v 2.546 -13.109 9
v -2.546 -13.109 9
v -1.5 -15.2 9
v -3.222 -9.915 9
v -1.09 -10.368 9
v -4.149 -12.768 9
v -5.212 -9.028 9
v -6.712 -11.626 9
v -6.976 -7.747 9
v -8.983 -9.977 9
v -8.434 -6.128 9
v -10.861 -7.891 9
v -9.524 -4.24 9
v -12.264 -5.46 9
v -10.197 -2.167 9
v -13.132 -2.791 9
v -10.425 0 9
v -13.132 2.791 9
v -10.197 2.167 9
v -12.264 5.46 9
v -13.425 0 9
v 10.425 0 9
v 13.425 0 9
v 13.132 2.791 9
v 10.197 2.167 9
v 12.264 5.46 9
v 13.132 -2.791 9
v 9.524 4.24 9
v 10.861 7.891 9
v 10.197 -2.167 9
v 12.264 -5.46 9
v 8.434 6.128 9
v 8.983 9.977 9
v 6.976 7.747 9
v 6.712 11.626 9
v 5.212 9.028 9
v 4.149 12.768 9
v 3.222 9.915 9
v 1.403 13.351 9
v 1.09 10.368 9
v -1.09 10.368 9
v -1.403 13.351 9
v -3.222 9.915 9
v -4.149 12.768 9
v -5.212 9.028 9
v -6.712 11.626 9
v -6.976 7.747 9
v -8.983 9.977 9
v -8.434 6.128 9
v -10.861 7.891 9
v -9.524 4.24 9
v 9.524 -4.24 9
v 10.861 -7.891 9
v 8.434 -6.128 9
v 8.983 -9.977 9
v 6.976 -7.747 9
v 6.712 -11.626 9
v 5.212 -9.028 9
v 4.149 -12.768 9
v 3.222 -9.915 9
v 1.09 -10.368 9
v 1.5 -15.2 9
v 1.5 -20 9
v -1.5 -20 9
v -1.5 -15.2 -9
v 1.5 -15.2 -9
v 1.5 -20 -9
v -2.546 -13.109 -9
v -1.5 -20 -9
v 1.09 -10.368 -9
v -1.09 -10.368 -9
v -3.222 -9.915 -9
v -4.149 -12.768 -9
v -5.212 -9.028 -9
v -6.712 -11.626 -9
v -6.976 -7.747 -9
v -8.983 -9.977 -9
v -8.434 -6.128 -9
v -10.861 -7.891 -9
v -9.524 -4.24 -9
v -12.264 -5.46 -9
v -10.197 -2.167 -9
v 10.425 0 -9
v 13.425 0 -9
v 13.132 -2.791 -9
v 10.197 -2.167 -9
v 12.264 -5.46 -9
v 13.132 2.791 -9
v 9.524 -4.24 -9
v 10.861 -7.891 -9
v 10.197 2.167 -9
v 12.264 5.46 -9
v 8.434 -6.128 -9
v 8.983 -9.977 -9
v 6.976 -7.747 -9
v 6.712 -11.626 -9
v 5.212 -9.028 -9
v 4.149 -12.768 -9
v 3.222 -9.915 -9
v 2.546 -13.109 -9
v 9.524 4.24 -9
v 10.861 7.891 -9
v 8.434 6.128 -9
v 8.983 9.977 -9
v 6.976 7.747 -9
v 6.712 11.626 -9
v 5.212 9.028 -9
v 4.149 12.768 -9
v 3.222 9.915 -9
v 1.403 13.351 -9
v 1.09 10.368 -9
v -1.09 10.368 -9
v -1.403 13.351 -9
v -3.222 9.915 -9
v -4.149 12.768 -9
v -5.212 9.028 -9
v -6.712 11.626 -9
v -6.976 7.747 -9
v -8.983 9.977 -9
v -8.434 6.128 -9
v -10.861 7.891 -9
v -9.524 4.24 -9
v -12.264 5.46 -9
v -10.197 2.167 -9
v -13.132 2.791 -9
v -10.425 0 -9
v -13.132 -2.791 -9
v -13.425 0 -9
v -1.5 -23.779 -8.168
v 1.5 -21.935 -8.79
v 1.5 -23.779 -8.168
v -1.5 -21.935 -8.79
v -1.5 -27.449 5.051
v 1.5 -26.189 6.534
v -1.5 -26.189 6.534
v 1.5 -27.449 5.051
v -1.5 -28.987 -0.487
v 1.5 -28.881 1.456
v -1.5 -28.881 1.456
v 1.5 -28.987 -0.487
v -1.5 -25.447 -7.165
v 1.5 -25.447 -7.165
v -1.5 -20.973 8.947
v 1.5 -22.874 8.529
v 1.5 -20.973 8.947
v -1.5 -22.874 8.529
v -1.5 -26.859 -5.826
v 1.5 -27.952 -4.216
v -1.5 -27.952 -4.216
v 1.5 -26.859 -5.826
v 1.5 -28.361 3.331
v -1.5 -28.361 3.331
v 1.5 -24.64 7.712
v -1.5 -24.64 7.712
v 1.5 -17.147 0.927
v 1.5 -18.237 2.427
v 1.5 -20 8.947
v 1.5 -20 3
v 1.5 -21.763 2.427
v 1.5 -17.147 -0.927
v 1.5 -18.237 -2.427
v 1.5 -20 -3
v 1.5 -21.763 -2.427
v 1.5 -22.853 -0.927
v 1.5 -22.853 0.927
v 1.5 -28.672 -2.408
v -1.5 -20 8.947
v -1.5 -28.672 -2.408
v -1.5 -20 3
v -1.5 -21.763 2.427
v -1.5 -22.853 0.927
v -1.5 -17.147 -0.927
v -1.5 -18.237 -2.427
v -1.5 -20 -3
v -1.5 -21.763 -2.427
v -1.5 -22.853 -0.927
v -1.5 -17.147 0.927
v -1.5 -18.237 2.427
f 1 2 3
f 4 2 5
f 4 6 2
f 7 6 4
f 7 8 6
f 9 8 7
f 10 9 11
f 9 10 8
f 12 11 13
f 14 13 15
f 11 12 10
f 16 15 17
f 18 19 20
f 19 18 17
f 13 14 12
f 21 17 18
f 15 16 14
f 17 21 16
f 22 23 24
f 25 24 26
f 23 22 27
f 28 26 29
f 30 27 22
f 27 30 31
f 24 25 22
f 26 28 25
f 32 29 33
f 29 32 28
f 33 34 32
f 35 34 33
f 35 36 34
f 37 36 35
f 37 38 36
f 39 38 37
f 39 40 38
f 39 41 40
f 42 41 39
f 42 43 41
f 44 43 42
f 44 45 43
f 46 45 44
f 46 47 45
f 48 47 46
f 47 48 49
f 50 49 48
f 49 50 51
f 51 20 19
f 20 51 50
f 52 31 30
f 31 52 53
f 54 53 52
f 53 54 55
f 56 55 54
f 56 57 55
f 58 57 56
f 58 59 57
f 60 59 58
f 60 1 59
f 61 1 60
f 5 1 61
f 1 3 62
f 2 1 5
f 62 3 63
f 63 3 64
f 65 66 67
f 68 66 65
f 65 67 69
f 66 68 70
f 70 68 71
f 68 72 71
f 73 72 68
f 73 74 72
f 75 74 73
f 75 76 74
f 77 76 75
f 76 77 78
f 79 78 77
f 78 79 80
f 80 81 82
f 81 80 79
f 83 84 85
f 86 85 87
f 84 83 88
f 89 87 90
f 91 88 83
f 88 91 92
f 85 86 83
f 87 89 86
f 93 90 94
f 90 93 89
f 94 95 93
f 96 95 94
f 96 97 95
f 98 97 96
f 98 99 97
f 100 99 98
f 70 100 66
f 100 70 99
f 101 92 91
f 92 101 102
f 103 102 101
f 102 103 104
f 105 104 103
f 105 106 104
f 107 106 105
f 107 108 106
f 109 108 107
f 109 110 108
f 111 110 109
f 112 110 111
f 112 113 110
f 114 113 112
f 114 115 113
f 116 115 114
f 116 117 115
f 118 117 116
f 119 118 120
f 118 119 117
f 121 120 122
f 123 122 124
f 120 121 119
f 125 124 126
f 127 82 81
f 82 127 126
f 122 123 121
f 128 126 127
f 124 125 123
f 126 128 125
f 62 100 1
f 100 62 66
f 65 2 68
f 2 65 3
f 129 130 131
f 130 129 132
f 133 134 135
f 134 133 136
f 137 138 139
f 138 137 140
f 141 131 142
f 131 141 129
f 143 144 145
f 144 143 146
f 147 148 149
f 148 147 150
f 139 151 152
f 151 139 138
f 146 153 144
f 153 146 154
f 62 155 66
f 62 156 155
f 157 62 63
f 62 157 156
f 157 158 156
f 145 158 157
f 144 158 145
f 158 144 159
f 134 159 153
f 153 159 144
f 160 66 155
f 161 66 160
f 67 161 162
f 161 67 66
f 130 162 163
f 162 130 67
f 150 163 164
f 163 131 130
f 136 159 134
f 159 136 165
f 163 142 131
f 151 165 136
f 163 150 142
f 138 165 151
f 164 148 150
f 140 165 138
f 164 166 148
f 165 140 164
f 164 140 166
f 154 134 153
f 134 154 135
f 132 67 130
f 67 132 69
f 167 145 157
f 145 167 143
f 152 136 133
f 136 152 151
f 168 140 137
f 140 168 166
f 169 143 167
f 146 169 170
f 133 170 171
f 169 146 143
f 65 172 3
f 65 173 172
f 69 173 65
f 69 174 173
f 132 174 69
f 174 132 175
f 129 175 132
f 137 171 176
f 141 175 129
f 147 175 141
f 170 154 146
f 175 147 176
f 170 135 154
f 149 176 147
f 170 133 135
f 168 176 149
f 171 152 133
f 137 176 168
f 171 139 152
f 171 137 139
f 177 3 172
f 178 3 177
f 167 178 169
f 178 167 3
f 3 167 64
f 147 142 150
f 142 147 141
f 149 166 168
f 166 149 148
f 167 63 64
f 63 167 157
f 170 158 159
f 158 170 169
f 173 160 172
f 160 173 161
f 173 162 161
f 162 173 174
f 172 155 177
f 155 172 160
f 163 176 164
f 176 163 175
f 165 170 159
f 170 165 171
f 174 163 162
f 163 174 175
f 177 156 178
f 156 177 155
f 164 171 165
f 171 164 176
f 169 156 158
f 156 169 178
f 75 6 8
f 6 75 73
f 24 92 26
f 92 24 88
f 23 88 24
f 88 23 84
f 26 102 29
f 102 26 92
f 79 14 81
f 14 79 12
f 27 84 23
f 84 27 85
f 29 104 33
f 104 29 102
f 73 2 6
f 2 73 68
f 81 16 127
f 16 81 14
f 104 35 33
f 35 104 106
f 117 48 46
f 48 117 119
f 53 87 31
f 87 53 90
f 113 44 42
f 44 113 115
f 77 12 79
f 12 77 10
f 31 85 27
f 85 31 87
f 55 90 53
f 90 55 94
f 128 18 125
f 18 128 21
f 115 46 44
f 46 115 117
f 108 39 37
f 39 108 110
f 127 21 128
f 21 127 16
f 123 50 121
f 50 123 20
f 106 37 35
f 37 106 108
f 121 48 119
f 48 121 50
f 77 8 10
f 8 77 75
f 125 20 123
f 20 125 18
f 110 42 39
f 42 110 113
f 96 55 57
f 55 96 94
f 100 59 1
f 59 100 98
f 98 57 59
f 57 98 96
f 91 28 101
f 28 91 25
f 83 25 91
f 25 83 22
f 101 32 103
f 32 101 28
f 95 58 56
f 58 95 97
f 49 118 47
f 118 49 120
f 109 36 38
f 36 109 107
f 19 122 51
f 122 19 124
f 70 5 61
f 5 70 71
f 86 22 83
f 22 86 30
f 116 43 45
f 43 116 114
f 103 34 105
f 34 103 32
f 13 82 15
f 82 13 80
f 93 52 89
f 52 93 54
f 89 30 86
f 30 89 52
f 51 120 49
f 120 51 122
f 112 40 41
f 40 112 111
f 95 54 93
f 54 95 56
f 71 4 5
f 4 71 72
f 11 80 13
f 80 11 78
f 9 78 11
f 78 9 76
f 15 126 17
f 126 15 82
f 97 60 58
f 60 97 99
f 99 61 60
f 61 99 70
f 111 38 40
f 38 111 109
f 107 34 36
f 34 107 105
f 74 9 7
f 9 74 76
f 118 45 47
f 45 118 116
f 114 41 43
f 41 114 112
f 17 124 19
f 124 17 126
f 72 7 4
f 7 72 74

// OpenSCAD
// file: ../parts/buttress.scad
/*
 * Written by Dermot Tynan, Kalopa Research.
 * GPLv2.
 *
 * All dimensions are in mm.
 */

/*
 * Create a buttress to reinforce a vertical column.
 * The height and length specify how high and how far out the
 * buttress goes, and the width is the width of the thing.
 */
module buttress(height, length, width)
{
	phi = atan(length / height);
	cx = length / sin(phi);
	cy = length / cos(phi);
	intersection() {
		rotate(a = [90, 90 - phi, 0])
			cube([cx, cy, width], center = true);
		translate([length/2, 0, cy*sin(phi)/2])
			cube([length, width + 2, height], center = true);
	}
}

buttress(25, 10, 2);
// file: constants.scad
/*
 * Written by Dermot Tynan, Kalopa Research.
 * GPLv2.
 *
 * This file has all the constants for the OpenWing sail.
 *
 * All dimensions are in mm.
 */
wall_thickness = 3;

cf_mast_outer_dia = 20.85;
cf_mast_inner_dia = 17.90;
cf_mast_insert_len = 20;

mast_cap_dia = 24;
mast_cap_height = 16;
mast_base_x = 24;
mast_base_y = 24;
mast_base_height = 12;
mast_base_grip_off = 8;
mast_base_grip_dia = 3.2;

gooseneck_height = 24;
gooseneck_len = 20;
gooseneck_barrel_dia = 11;
gooseplate_width = 26;

kicker_ring_dia = 18;

attach_pin_dia = 6;
washer_thickness = 0.8;
rigging_line_dia = 4;
// main file
/*
 * Written by Dermot Tynan, Kalopa Research.
 * GPLv2.
 *
 * This is the definition for the five mast supports on the upper
 * leading-edge of the mast, A8 -> A12.
 *
 * All dimensions are in mm.
 */
include <constants.scad>
use <../parts/buttress.scad>

module attach_ring()
{
	cy = kicker_ring_dia * 0.6;
	bx = kicker_ring_dia * 0.3;
	by = kicker_ring_dia * 0.6;
	bz = -kicker_ring_dia * 0.5;
	difference() {
		union() {
			cylinder(r = kicker_ring_dia/2, h = wall_thickness, center = true);
			translate([0, cy/2, 0]) cube([kicker_ring_dia, cy, wall_thickness], center = true);
			translate([0, by, bz]) rotate([0, 0, -90]) buttress(bx, by, kicker_ring_dia);
			translate([0, by, -bz]) rotate([180, 0, -90]) buttress(bx, by, kicker_ring_dia);
		}
 		cylinder(r = attach_pin_dia/2, h = wall_thickness + 2, center = true);
	}
}

module kicker_ring()
{
	difference() {
		union() {
			cylinder(r = cf_mast_outer_dia/2 + wall_thickness, h = kicker_ring_dia, center = true);
			translate([0, -20, 0]) rotate([0, 90, 0])
				attach_ring();
		}
	 	cylinder(r = cf_mast_outer_dia/2, h = gooseneck_height + 2, center = true);
	}
}

kicker_ring();
